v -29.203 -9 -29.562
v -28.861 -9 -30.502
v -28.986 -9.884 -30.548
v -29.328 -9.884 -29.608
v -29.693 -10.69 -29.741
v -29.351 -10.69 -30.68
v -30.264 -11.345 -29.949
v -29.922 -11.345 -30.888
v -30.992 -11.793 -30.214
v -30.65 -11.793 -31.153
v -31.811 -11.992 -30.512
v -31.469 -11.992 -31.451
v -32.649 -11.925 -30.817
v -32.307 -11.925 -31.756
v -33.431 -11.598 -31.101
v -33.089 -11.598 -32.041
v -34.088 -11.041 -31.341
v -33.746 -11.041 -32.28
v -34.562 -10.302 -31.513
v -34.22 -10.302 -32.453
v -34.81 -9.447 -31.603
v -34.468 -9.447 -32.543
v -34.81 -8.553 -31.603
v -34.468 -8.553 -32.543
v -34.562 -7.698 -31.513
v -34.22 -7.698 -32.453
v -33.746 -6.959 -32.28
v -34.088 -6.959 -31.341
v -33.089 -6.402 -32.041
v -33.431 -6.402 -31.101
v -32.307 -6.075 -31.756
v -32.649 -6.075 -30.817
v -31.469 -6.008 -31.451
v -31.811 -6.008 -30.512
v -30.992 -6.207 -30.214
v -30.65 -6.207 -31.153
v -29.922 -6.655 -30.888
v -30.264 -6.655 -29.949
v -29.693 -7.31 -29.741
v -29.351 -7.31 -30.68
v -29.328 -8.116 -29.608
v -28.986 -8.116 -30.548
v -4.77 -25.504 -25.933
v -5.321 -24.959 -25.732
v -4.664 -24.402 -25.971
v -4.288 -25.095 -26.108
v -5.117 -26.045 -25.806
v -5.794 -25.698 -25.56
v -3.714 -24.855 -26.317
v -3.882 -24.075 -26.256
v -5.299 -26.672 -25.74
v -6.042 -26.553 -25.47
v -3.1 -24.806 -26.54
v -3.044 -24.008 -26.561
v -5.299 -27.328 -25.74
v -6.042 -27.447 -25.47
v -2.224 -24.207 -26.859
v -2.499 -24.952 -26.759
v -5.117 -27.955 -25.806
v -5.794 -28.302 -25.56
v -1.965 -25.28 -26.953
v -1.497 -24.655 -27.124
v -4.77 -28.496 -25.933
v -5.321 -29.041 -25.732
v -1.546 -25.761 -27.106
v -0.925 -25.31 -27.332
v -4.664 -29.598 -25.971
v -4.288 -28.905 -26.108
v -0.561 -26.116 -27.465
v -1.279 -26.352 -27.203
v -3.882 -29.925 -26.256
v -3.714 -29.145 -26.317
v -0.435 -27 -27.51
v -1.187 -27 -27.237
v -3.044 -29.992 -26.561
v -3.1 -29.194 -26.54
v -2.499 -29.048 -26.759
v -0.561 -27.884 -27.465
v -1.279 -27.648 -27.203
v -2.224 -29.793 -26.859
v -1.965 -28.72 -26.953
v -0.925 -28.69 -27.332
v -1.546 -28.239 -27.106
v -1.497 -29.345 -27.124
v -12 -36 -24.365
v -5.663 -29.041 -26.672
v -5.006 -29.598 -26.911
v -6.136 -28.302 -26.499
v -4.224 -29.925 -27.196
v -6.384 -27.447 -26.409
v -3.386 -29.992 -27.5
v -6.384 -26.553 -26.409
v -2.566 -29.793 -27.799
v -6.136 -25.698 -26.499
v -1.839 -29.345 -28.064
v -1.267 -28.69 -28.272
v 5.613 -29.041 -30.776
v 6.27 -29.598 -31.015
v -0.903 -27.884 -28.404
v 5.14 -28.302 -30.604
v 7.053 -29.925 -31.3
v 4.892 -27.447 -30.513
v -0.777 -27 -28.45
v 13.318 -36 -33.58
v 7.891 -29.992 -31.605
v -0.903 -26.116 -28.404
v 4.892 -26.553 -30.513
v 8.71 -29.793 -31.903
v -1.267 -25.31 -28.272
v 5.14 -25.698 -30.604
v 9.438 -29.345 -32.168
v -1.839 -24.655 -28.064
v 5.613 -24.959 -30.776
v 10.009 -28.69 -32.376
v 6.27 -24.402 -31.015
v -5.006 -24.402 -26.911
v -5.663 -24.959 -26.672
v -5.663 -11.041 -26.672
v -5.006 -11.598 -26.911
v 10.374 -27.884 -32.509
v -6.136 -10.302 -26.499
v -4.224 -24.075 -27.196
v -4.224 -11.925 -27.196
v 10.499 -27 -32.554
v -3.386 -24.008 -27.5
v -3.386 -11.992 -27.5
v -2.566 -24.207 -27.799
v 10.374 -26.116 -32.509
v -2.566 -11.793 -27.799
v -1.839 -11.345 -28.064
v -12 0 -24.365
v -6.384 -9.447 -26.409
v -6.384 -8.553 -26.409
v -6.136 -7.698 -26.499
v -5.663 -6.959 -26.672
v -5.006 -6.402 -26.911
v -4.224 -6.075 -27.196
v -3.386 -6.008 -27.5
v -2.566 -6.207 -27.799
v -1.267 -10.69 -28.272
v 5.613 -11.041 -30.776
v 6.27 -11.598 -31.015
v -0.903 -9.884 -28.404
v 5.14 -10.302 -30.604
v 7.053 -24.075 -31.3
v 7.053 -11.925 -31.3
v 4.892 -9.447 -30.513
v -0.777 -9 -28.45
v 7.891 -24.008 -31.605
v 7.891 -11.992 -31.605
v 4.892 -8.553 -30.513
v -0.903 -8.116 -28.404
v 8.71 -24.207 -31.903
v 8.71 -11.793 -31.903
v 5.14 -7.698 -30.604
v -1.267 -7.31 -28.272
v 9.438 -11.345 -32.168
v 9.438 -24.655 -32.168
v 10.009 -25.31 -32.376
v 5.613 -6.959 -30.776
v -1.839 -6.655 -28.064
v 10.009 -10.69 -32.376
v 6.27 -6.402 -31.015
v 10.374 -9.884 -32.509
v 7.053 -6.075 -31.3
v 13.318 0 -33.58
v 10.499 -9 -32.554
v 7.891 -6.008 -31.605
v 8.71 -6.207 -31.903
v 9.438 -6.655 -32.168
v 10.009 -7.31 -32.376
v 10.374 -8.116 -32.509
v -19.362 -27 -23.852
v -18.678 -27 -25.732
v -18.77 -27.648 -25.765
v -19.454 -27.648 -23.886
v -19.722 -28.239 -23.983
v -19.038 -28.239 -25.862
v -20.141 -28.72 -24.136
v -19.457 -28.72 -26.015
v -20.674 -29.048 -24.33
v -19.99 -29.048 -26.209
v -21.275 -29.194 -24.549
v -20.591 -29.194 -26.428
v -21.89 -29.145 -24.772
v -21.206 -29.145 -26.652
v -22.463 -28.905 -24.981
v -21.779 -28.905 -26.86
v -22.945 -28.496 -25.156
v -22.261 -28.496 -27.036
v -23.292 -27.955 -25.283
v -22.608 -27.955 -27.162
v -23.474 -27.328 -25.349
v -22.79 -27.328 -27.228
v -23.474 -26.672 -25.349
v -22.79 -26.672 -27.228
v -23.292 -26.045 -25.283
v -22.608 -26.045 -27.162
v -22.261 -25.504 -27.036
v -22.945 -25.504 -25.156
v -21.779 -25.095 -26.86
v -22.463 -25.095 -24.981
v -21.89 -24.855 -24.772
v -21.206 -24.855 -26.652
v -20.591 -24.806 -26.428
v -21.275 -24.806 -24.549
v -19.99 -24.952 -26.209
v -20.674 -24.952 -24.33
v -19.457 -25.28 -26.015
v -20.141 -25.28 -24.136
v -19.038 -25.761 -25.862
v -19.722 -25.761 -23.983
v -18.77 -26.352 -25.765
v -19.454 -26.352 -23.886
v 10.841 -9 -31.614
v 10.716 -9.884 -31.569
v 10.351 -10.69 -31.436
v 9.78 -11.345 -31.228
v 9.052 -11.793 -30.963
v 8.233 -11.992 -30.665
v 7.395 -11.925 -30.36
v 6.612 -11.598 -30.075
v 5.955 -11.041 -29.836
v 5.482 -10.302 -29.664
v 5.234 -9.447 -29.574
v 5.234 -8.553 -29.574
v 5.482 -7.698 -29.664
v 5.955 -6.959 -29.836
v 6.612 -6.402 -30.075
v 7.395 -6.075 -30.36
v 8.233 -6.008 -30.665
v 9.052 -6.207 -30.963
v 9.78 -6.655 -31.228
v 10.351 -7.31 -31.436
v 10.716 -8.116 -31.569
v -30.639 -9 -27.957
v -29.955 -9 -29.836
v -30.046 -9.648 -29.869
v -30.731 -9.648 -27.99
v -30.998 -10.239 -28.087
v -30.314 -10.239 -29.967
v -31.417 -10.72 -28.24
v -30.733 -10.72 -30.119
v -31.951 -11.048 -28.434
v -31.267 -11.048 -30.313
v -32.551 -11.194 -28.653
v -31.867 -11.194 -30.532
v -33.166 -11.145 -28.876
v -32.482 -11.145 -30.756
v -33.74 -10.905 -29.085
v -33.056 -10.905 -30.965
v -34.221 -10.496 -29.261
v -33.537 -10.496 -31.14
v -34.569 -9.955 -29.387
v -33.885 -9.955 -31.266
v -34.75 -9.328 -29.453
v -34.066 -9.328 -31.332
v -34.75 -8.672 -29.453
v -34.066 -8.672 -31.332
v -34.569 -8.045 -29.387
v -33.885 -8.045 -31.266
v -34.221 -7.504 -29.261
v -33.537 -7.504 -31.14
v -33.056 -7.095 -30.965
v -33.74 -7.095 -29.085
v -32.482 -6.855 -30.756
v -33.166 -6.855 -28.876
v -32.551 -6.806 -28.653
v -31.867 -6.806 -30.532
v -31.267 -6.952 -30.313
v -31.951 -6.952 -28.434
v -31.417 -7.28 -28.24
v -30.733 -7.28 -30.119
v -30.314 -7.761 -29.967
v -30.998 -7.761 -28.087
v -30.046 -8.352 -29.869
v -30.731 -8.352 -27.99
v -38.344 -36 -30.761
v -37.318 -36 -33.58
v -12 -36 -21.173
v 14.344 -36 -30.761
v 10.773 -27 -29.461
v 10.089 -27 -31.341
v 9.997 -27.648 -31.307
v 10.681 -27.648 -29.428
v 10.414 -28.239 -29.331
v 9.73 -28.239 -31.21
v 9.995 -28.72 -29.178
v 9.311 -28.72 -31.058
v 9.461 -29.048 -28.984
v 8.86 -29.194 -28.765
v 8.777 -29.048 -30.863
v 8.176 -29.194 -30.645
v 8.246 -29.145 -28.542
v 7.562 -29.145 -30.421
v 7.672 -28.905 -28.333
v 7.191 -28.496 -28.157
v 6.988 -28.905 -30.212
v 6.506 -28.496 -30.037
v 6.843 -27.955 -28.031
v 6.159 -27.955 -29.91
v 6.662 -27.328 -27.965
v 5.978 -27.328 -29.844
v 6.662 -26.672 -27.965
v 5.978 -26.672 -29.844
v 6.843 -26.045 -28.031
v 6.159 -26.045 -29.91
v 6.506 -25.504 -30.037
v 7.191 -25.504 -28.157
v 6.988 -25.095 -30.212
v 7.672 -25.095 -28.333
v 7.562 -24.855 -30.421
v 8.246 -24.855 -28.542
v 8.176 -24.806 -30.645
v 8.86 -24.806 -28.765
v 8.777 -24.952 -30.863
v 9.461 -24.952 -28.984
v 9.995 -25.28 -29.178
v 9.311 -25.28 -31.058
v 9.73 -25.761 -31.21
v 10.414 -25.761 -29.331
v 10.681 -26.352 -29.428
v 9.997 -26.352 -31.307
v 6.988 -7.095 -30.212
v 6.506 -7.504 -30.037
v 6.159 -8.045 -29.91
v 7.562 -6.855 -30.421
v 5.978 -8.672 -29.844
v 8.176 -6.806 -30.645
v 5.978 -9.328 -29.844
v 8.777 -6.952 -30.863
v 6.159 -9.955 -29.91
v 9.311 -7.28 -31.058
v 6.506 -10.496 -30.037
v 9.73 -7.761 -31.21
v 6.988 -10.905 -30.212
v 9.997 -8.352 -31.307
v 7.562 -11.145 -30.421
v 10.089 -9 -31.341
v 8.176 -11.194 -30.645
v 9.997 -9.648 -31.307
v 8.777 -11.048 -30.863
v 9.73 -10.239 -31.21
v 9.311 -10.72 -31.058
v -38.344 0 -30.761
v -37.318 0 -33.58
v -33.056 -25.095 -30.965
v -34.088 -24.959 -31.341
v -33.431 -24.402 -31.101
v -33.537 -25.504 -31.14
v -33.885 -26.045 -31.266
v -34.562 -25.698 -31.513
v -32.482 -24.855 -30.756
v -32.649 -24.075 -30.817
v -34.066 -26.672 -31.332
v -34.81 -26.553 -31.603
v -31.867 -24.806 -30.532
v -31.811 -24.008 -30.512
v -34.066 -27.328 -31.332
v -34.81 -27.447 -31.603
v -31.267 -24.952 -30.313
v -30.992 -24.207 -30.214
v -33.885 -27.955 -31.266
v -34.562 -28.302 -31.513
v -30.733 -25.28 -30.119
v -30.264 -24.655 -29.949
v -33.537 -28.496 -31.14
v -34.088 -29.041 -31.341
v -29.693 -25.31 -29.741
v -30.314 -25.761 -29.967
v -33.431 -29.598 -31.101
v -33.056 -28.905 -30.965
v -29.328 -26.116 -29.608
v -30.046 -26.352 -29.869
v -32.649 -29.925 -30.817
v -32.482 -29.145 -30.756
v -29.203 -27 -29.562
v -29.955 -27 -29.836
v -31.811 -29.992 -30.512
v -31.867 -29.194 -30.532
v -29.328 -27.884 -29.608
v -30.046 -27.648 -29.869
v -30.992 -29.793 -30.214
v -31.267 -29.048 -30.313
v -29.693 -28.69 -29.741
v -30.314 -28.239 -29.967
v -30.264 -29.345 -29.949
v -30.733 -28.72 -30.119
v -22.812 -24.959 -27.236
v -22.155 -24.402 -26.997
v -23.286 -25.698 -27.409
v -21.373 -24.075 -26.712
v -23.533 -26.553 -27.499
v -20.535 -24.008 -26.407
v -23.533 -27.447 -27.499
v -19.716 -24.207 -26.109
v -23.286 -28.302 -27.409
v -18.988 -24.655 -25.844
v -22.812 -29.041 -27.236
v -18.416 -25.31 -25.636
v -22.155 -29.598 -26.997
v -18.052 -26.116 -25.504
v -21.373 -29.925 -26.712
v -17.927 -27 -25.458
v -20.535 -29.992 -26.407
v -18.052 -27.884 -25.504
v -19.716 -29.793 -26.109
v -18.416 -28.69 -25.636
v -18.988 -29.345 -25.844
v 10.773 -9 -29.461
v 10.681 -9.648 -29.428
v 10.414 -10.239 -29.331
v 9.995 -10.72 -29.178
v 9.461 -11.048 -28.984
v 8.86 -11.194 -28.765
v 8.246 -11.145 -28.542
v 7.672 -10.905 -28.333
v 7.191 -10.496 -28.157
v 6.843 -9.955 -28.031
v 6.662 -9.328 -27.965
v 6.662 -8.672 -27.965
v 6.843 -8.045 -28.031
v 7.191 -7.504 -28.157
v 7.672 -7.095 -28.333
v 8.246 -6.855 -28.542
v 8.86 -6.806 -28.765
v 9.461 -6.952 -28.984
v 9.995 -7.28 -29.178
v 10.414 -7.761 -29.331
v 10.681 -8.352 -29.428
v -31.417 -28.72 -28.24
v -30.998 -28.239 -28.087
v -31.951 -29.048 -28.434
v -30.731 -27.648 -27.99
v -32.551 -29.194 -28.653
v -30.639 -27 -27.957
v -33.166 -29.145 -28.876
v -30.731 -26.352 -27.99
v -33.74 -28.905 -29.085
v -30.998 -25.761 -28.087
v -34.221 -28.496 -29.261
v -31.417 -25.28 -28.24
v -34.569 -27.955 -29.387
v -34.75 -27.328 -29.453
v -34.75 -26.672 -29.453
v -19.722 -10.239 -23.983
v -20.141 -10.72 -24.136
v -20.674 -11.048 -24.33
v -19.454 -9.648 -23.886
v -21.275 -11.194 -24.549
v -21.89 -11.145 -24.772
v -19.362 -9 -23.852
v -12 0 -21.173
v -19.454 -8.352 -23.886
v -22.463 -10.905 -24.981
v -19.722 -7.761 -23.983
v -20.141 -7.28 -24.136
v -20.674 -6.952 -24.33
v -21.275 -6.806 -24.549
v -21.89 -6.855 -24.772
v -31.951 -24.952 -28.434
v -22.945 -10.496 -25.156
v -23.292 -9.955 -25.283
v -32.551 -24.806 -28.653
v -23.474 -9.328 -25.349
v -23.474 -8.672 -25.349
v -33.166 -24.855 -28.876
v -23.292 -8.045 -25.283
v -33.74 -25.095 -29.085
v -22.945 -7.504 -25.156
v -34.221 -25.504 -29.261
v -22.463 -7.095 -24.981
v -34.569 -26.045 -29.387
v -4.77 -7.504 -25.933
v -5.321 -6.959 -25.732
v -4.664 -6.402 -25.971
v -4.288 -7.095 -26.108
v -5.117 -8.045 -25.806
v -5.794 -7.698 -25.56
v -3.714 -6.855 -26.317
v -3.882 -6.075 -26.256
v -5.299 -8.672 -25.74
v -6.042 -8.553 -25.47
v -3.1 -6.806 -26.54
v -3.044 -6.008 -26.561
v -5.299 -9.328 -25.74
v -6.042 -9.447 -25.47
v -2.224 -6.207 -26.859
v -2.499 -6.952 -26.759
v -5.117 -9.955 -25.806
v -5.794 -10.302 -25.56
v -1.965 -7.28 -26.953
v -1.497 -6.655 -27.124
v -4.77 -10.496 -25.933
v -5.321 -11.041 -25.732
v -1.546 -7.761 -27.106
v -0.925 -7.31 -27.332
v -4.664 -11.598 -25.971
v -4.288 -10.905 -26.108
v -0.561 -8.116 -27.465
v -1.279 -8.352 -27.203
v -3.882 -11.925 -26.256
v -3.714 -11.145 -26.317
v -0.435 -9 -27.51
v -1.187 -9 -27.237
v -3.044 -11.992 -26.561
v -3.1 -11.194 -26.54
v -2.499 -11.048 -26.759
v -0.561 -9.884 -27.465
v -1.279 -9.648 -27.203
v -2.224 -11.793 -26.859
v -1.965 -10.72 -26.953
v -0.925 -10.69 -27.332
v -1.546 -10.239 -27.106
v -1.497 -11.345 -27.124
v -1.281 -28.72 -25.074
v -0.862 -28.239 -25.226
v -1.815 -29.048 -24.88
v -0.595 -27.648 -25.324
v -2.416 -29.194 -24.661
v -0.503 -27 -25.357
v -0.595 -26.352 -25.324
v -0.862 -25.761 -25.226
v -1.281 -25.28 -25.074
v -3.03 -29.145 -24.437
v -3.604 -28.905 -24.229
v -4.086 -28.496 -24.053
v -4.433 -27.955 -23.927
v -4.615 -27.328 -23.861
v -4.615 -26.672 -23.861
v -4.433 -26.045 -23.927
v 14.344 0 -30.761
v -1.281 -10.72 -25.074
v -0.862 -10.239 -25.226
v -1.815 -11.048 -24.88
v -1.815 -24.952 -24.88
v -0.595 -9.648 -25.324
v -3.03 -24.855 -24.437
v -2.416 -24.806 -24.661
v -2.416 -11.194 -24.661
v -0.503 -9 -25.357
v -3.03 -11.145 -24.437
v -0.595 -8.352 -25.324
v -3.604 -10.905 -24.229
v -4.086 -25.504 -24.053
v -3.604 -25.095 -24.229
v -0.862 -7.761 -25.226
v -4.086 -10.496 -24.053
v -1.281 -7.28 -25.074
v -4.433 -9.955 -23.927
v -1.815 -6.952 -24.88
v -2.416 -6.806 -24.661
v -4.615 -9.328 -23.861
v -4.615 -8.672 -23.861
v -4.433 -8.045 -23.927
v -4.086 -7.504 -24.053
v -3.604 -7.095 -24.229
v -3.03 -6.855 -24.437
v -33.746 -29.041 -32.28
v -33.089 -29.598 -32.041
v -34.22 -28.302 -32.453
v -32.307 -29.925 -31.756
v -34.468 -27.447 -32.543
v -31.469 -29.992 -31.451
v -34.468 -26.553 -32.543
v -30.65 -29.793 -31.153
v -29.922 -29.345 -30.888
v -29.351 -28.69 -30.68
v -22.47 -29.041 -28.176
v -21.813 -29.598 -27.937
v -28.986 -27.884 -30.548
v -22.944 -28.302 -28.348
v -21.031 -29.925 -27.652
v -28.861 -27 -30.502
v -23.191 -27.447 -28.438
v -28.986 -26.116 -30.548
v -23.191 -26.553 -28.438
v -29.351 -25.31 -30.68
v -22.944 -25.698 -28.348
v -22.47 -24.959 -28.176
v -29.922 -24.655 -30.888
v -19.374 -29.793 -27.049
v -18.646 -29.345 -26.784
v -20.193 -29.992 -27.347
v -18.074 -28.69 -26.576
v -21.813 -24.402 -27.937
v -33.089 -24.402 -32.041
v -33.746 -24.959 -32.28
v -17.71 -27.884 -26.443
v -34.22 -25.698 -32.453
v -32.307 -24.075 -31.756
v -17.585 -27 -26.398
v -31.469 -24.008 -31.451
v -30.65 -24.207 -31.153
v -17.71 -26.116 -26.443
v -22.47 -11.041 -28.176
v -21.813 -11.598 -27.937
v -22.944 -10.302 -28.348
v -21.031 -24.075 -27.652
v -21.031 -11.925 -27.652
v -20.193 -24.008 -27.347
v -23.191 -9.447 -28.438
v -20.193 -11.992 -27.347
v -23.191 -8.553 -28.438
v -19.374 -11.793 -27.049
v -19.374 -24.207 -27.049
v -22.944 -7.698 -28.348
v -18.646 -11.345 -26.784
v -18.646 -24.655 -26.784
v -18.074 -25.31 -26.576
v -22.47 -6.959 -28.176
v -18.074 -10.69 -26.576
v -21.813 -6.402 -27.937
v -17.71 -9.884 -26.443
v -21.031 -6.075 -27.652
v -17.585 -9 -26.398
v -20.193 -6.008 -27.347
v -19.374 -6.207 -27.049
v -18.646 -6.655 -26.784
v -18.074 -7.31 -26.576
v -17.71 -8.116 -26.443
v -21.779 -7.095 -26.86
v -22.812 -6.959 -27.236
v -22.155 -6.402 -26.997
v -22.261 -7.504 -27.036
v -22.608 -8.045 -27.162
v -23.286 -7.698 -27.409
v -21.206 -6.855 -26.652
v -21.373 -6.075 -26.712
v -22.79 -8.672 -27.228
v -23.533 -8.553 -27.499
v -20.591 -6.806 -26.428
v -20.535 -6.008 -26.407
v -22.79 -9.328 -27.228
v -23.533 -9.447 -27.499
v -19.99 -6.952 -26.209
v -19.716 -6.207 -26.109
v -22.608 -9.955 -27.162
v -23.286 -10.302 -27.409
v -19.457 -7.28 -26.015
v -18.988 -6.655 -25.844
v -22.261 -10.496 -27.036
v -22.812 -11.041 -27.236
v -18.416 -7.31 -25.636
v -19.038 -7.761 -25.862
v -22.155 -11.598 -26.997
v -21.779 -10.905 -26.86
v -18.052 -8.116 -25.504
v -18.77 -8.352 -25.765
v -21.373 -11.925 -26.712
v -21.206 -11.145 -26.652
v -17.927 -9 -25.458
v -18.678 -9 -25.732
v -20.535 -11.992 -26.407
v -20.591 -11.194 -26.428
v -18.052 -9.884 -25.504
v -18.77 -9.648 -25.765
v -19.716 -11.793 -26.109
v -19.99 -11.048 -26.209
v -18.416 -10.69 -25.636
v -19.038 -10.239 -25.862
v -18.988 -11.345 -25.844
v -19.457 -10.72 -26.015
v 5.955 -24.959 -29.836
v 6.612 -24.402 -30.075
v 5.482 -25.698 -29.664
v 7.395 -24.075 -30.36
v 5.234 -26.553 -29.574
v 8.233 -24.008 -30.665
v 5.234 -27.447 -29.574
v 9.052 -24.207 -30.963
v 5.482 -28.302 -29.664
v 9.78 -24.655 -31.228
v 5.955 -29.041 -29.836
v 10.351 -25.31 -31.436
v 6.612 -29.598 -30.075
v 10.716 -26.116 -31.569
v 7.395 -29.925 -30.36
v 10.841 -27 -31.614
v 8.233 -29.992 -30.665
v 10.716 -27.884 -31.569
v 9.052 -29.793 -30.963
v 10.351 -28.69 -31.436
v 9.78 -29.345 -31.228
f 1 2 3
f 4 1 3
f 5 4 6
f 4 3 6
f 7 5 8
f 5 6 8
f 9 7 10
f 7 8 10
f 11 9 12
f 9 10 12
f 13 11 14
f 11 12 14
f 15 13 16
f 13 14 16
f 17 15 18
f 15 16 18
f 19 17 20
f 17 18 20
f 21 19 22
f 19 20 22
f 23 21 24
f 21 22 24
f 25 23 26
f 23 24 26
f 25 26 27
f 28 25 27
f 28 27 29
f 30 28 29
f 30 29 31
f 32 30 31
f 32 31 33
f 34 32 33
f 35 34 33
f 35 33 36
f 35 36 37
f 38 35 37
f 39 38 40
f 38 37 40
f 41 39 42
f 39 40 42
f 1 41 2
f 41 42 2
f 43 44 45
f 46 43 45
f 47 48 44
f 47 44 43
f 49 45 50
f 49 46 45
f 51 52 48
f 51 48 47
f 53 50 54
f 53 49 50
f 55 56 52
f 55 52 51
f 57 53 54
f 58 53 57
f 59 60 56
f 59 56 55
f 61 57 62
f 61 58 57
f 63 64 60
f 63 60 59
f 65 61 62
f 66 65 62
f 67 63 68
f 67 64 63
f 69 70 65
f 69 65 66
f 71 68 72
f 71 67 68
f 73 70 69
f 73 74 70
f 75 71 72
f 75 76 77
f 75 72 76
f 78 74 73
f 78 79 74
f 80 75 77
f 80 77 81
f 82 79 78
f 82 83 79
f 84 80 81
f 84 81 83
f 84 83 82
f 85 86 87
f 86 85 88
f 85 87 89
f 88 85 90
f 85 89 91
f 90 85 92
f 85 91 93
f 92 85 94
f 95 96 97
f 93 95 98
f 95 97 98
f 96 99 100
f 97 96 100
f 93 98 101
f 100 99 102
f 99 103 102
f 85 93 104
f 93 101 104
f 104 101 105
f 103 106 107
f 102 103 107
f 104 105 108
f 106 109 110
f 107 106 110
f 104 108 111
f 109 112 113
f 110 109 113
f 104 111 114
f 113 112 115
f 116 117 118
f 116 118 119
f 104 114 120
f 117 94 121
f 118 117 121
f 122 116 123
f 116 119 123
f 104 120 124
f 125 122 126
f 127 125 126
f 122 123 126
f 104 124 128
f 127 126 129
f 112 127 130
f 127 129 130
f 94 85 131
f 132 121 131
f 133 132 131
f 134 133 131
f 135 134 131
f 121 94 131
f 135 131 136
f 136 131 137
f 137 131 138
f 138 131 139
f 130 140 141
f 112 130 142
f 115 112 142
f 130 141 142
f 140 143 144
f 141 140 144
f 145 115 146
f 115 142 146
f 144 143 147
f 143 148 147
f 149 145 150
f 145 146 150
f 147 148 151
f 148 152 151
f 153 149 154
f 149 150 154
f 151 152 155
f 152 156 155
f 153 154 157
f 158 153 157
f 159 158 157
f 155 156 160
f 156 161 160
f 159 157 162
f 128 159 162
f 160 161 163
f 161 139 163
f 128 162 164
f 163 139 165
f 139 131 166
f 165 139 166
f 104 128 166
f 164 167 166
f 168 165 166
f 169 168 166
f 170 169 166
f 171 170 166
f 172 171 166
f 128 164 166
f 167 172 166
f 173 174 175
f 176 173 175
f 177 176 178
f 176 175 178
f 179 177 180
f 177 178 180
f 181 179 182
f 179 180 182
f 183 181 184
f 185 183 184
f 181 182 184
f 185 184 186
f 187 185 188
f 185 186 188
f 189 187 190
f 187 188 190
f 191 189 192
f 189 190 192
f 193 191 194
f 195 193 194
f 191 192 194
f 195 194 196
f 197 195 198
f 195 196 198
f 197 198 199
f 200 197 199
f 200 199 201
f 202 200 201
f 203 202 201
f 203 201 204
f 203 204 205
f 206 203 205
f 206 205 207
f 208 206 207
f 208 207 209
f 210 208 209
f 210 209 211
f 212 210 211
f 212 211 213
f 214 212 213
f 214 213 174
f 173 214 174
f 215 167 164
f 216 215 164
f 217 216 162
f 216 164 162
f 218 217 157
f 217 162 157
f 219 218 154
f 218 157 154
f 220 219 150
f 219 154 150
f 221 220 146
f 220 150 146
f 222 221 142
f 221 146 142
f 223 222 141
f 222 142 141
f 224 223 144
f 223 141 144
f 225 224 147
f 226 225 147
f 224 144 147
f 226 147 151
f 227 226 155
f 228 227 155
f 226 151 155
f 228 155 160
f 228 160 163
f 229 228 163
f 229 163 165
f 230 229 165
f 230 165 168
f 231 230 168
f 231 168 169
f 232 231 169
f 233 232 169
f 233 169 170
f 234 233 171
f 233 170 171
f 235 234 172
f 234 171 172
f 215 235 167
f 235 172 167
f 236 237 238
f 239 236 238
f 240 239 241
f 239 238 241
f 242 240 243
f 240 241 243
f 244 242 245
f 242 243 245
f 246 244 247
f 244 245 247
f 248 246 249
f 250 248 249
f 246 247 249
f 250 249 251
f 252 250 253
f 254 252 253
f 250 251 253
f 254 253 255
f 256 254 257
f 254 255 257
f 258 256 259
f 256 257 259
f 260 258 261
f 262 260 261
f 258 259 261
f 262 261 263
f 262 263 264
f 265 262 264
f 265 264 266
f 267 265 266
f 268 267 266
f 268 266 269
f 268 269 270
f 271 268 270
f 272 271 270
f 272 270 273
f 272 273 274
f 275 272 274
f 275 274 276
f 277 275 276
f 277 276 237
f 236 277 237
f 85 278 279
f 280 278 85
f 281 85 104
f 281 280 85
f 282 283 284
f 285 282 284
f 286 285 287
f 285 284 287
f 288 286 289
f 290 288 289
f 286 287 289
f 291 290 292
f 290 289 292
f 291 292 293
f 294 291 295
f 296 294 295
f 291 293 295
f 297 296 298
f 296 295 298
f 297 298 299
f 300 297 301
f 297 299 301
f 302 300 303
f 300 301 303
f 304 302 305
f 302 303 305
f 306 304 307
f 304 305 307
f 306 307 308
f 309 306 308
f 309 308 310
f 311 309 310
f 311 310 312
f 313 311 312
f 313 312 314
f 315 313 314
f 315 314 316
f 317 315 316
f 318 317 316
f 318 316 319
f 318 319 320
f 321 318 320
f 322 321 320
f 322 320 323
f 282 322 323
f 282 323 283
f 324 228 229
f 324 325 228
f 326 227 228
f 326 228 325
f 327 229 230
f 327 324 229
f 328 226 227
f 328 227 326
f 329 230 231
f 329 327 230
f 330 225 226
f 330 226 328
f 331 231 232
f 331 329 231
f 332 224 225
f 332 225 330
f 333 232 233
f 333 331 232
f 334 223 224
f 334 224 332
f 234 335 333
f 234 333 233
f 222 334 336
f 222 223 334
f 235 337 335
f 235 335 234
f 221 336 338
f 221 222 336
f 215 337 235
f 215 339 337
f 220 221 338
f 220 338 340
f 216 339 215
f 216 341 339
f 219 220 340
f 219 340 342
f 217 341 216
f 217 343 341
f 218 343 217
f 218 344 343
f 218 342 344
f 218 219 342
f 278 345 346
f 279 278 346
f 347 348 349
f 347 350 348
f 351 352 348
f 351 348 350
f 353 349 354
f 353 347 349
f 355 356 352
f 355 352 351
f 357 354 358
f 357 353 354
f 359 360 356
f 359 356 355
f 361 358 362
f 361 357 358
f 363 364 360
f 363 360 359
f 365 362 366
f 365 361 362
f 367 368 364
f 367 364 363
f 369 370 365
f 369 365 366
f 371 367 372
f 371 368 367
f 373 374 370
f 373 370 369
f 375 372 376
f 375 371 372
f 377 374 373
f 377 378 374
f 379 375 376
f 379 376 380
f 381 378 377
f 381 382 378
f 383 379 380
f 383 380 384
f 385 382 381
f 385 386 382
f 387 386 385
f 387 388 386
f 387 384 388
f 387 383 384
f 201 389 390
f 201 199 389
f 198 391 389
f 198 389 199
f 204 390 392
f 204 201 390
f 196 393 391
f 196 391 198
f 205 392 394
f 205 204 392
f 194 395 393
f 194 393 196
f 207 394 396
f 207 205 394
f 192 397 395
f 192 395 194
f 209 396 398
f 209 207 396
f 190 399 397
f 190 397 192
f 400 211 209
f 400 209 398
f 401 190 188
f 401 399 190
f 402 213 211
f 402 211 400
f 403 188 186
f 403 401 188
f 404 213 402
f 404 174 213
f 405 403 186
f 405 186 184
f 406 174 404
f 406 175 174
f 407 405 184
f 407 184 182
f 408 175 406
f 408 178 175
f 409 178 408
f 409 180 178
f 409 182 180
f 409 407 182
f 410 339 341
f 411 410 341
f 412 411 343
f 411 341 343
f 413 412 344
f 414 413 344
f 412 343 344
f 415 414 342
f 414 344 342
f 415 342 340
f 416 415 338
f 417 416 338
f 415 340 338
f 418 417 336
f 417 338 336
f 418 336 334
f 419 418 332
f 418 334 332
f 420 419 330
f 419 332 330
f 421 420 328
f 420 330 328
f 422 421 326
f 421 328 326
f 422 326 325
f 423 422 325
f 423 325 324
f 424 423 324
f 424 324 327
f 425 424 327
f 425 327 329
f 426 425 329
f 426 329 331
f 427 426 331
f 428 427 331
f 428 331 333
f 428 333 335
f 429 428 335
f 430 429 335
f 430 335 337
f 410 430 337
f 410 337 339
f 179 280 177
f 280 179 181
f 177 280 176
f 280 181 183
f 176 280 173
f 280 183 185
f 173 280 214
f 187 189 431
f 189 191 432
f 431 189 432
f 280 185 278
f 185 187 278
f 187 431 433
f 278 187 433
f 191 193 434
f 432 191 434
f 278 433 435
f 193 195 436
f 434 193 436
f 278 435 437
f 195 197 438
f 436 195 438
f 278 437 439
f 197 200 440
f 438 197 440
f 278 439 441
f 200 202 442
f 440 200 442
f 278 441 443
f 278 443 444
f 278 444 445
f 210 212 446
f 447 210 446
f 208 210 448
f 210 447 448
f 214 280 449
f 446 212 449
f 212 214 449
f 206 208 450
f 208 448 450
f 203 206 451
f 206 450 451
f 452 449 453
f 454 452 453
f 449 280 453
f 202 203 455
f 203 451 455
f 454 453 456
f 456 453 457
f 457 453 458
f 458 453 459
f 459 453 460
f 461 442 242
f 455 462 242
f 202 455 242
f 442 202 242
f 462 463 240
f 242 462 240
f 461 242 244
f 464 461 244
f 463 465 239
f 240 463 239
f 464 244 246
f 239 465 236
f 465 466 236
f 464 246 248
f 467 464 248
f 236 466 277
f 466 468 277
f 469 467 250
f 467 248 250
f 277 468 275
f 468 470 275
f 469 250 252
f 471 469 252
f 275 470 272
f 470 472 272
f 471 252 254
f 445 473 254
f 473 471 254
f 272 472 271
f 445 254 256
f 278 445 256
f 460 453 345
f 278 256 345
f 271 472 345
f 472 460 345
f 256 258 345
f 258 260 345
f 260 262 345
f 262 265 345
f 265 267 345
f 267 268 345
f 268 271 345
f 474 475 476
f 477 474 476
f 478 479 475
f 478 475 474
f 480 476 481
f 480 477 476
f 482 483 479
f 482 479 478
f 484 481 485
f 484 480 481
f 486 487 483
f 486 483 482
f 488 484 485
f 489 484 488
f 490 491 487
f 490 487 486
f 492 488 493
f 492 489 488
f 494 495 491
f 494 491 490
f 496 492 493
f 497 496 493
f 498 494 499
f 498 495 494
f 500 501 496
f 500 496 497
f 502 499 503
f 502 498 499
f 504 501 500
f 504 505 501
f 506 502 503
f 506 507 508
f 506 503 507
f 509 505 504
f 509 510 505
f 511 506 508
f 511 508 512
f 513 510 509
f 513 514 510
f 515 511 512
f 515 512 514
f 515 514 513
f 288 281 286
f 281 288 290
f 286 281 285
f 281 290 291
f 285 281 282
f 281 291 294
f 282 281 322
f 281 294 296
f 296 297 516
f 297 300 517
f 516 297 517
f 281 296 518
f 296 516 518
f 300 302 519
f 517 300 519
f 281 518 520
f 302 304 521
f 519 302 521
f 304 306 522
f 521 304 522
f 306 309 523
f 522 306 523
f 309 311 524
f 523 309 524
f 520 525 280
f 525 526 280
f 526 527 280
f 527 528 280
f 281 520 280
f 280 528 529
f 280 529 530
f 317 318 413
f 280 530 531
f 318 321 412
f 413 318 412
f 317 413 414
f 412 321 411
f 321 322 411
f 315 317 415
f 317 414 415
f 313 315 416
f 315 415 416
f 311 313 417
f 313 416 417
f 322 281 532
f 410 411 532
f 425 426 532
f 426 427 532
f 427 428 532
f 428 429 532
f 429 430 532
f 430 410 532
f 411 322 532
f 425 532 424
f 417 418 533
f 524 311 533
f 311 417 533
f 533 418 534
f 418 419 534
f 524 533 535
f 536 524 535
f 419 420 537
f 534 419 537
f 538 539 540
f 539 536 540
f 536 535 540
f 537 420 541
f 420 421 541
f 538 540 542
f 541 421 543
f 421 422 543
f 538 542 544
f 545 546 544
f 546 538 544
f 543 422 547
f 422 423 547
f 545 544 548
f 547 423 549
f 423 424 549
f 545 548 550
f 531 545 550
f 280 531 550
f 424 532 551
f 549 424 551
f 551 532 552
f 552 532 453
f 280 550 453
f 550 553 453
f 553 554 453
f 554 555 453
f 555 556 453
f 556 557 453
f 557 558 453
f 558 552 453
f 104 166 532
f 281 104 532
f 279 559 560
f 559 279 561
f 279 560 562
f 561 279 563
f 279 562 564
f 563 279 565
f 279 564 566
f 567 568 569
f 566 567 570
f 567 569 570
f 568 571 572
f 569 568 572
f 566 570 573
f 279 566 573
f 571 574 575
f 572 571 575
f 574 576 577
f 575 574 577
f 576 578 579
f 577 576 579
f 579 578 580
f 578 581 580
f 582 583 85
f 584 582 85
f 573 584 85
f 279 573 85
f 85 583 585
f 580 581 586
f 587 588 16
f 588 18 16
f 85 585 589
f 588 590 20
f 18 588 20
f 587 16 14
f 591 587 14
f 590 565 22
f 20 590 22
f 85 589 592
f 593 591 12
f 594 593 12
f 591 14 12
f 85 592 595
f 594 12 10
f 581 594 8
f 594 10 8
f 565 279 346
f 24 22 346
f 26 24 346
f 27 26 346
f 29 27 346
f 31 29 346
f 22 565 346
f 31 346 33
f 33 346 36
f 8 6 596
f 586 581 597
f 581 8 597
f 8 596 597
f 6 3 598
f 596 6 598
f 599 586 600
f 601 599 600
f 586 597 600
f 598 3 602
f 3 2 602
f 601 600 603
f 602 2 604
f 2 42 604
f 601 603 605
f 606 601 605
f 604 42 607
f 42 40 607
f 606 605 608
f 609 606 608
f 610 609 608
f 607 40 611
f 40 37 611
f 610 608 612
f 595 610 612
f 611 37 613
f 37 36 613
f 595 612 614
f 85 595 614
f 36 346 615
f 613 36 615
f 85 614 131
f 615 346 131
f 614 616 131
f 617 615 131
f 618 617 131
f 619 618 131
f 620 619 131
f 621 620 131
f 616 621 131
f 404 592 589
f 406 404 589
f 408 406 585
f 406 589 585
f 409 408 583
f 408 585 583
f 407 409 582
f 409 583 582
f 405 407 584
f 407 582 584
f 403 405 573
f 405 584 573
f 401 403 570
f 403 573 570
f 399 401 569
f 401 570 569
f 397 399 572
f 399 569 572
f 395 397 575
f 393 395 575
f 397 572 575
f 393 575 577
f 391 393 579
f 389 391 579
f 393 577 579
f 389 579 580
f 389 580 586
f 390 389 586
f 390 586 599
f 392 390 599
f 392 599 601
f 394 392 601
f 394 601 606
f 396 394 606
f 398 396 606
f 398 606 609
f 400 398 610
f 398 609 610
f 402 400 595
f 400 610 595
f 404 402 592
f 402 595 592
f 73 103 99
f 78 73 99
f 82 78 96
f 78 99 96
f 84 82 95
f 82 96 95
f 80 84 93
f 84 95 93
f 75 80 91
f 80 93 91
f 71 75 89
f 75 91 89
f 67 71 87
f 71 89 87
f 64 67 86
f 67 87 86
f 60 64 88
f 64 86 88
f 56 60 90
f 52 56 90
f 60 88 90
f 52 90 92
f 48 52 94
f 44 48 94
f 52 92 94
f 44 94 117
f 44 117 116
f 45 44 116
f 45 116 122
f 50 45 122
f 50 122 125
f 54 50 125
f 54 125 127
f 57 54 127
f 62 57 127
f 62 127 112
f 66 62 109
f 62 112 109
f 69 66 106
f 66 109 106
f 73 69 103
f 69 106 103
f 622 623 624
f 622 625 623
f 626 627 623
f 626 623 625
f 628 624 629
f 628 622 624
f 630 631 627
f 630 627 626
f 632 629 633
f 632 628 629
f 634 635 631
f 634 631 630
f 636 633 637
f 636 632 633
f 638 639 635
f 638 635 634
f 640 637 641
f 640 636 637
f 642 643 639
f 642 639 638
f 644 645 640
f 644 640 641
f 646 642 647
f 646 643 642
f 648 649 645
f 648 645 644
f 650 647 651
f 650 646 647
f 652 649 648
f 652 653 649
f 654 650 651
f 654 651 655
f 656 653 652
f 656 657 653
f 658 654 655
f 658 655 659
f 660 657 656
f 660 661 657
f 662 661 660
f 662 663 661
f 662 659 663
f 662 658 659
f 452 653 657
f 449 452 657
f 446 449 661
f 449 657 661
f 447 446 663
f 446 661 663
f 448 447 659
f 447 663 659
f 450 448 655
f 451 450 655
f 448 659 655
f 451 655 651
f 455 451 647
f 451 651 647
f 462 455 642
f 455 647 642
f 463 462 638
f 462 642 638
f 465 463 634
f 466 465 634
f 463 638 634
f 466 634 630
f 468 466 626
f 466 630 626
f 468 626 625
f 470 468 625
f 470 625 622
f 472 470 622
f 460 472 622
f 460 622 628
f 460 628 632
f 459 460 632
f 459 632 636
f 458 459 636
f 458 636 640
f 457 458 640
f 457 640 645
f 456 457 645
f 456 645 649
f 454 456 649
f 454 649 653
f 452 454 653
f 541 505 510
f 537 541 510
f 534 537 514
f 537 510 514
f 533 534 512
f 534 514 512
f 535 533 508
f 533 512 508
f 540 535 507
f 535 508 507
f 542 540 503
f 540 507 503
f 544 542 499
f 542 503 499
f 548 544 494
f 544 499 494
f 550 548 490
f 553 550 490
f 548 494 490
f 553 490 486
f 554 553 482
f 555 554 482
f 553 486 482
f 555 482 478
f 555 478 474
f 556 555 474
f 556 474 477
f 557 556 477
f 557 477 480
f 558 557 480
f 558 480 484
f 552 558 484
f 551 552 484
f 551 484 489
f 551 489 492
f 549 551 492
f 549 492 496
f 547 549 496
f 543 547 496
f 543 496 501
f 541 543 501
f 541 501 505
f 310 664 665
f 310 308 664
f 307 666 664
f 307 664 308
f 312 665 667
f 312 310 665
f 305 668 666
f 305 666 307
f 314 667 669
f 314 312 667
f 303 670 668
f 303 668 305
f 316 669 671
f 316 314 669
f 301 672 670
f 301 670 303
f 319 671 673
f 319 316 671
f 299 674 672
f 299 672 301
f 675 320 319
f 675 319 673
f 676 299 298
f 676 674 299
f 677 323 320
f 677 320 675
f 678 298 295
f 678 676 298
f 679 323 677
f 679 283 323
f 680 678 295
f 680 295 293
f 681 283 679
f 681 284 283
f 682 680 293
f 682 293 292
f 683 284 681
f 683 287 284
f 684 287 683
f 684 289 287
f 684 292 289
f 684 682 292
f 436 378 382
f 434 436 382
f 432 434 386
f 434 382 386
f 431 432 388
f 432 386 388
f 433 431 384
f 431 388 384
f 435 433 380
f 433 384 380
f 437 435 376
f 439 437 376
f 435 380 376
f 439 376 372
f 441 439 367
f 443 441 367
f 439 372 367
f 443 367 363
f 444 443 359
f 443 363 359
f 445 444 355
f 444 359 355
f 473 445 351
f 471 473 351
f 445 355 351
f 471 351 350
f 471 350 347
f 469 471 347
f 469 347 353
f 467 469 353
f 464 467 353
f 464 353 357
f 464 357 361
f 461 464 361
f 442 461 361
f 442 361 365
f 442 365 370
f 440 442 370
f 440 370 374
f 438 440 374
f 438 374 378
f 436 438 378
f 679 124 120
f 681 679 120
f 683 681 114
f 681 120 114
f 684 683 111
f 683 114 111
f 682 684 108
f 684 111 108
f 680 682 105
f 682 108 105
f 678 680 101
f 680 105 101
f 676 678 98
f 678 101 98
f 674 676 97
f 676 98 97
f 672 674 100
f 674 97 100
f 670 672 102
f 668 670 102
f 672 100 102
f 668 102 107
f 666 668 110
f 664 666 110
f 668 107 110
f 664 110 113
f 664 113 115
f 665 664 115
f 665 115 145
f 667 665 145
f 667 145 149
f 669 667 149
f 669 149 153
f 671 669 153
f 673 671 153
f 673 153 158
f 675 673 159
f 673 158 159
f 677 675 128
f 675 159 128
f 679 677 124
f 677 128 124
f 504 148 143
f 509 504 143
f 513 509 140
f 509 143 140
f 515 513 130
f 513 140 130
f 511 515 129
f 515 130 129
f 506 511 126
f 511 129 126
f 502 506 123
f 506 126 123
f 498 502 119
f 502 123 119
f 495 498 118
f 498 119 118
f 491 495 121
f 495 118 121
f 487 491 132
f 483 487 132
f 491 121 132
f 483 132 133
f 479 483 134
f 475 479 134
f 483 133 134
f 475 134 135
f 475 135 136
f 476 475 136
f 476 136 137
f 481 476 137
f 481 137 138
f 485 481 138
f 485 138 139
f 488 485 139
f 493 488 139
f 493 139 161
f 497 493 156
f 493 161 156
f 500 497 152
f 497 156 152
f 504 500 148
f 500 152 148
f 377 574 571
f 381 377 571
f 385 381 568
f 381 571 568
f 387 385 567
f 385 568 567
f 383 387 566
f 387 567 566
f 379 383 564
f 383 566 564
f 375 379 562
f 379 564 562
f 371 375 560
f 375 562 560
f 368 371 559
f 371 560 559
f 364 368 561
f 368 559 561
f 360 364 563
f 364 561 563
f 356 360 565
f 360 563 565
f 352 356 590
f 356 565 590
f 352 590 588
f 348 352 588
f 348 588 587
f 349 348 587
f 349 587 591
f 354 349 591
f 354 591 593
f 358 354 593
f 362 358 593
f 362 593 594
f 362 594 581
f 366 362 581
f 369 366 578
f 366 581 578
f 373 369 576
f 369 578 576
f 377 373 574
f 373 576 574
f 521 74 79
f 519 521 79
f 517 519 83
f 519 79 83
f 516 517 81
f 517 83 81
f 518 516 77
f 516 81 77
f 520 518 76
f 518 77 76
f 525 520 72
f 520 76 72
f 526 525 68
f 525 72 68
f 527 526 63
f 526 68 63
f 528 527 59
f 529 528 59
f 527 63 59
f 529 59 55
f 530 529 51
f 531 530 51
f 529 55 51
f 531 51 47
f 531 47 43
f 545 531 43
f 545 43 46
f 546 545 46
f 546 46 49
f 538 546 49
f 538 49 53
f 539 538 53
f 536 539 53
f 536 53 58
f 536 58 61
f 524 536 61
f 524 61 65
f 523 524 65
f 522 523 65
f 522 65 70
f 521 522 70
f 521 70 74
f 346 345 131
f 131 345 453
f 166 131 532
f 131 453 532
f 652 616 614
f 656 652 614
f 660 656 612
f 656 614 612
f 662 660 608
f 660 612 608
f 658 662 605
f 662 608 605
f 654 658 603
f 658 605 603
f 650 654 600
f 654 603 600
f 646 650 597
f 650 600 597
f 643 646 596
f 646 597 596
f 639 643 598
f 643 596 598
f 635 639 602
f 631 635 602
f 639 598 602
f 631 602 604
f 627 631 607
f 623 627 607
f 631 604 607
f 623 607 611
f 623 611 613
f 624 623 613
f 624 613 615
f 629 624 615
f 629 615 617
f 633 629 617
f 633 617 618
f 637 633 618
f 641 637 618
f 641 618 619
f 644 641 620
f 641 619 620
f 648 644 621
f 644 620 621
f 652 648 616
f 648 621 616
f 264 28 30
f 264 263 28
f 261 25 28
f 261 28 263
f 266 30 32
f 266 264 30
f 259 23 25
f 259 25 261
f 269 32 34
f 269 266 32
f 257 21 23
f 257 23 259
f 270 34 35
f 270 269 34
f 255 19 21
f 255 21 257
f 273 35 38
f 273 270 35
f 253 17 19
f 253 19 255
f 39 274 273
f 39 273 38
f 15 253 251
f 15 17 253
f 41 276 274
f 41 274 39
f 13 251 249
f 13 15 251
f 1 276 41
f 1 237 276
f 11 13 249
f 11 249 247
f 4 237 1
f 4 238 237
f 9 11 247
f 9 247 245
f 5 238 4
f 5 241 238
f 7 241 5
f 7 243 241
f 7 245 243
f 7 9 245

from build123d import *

# Parameters (mm, degrees)
F1_DEPTH = 36
F2_R     = 2.2
F3_DEPTH = 12.0112263536
F2_R_2   = 3
F4_DEPTH = 1
F5_R     = 2.2
F6_DEPTH = 12.0112263536
F5_R_2   = 3
F7_DEPTH = 1


with BuildPart() as f1:
    # F0 (on Front) → F1 (new body)
    with BuildSketch(Plane.XZ):
        Polygon((-12, -21.1726237282), (-38.344139459, -30.7611063387), (-37.3180790291, -33.580184201), (-12, -24.3651570457), (13.3180790291, -33.580184201), (14.344139459, -30.7611063387), align=None)
    extrude(amount=F1_DEPTH)

    # F2 (on face) → F3 (cut, through all)
    with BuildSketch(Plane(origin=(6.4270771872, 0, -17.658249445), x_dir=(0.9396926208, 0, 0.3420201433), z_dir=(0.3420201433, 0, -0.9396926208))):
        with Locations((-40.5526228989, 27)):
            Circle(F2_R)
        with Locations((-28.5526228989, 27)):
            Circle(F2_R)
        with Locations((-28.5526228989, 9)):
            Circle(F2_R)
        with Locations((-40.5526228989, 9)):
            Circle(F2_R)
    extrude(amount=-F3_DEPTH, mode=Mode.SUBTRACT)

    # F2 (on face) → F4 (cut)
    with BuildSketch(Plane(origin=(6.4270771872, 0, -17.658249445), x_dir=(0.9396926208, 0, 0.3420201433), z_dir=(0.3420201433, 0, -0.9396926208))):
        with Locations((-40.5526228989, 27)):
            Circle(F2_R_2)
        with Locations((-40.5526228989, 27)):
            Circle(F2_R, mode=Mode.SUBTRACT)
        with Locations((-40.5526228989, 9)):
            Circle(F2_R_2)
        with Locations((-40.5526228989, 9)):
            Circle(F2_R, mode=Mode.SUBTRACT)
        with Locations((-28.5526228989, 9)):
            Circle(F2_R_2)
        with Locations((-28.5526228989, 9)):
            Circle(F2_R, mode=Mode.SUBTRACT)
        with Locations((-28.5526228989, 27)):
            Circle(F2_R_2)
        with Locations((-28.5526228989, 27)):
            Circle(F2_R, mode=Mode.SUBTRACT)
    extrude(amount=-F4_DEPTH, mode=Mode.SUBTRACT)

    # F5 (on face) → F6 (cut, through all)
    with BuildSketch(Plane(origin=(-9.2345438698, 0, -25.3717007612), x_dir=(0.9396926208, 0, -0.3420201433), z_dir=(-0.3420201433, 0, -0.9396926208))):
        with Locations((6, 27)):
            Circle(F5_R)
        with Locations((18, 27)):
            Circle(F5_R)
        with Locations((6, 9)):
            Circle(F5_R)
        with Locations((18, 9)):
            Circle(F5_R)
    extrude(amount=-F6_DEPTH, mode=Mode.SUBTRACT)

    # F5 (on face) → F7 (cut)
    with BuildSketch(Plane(origin=(-9.2345438698, 0, -25.3717007612), x_dir=(0.9396926208, 0, -0.3420201433), z_dir=(-0.3420201433, 0, -0.9396926208))):
        with Locations((6, 27)):
            Circle(F5_R_2)
        with Locations((6, 27)):
            Circle(F5_R, mode=Mode.SUBTRACT)
        with Locations((18, 27)):
            Circle(F5_R_2)
        with Locations((18, 27)):
            Circle(F5_R, mode=Mode.SUBTRACT)
        with Locations((18, 9)):
            Circle(F5_R_2)
        with Locations((18, 9)):
            Circle(F5_R, mode=Mode.SUBTRACT)
        with Locations((6, 9)):
            Circle(F5_R_2)
        with Locations((6, 9)):
            Circle(F5_R, mode=Mode.SUBTRACT)
    extrude(amount=-F7_DEPTH, mode=Mode.SUBTRACT)


solid = f1.part
